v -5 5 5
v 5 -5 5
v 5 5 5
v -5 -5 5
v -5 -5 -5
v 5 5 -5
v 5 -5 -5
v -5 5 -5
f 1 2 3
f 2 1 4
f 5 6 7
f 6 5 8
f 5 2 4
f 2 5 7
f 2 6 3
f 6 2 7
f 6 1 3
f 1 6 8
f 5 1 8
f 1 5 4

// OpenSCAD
cube([10, 10, 10], center = true);

// This is merely a placeholder 
